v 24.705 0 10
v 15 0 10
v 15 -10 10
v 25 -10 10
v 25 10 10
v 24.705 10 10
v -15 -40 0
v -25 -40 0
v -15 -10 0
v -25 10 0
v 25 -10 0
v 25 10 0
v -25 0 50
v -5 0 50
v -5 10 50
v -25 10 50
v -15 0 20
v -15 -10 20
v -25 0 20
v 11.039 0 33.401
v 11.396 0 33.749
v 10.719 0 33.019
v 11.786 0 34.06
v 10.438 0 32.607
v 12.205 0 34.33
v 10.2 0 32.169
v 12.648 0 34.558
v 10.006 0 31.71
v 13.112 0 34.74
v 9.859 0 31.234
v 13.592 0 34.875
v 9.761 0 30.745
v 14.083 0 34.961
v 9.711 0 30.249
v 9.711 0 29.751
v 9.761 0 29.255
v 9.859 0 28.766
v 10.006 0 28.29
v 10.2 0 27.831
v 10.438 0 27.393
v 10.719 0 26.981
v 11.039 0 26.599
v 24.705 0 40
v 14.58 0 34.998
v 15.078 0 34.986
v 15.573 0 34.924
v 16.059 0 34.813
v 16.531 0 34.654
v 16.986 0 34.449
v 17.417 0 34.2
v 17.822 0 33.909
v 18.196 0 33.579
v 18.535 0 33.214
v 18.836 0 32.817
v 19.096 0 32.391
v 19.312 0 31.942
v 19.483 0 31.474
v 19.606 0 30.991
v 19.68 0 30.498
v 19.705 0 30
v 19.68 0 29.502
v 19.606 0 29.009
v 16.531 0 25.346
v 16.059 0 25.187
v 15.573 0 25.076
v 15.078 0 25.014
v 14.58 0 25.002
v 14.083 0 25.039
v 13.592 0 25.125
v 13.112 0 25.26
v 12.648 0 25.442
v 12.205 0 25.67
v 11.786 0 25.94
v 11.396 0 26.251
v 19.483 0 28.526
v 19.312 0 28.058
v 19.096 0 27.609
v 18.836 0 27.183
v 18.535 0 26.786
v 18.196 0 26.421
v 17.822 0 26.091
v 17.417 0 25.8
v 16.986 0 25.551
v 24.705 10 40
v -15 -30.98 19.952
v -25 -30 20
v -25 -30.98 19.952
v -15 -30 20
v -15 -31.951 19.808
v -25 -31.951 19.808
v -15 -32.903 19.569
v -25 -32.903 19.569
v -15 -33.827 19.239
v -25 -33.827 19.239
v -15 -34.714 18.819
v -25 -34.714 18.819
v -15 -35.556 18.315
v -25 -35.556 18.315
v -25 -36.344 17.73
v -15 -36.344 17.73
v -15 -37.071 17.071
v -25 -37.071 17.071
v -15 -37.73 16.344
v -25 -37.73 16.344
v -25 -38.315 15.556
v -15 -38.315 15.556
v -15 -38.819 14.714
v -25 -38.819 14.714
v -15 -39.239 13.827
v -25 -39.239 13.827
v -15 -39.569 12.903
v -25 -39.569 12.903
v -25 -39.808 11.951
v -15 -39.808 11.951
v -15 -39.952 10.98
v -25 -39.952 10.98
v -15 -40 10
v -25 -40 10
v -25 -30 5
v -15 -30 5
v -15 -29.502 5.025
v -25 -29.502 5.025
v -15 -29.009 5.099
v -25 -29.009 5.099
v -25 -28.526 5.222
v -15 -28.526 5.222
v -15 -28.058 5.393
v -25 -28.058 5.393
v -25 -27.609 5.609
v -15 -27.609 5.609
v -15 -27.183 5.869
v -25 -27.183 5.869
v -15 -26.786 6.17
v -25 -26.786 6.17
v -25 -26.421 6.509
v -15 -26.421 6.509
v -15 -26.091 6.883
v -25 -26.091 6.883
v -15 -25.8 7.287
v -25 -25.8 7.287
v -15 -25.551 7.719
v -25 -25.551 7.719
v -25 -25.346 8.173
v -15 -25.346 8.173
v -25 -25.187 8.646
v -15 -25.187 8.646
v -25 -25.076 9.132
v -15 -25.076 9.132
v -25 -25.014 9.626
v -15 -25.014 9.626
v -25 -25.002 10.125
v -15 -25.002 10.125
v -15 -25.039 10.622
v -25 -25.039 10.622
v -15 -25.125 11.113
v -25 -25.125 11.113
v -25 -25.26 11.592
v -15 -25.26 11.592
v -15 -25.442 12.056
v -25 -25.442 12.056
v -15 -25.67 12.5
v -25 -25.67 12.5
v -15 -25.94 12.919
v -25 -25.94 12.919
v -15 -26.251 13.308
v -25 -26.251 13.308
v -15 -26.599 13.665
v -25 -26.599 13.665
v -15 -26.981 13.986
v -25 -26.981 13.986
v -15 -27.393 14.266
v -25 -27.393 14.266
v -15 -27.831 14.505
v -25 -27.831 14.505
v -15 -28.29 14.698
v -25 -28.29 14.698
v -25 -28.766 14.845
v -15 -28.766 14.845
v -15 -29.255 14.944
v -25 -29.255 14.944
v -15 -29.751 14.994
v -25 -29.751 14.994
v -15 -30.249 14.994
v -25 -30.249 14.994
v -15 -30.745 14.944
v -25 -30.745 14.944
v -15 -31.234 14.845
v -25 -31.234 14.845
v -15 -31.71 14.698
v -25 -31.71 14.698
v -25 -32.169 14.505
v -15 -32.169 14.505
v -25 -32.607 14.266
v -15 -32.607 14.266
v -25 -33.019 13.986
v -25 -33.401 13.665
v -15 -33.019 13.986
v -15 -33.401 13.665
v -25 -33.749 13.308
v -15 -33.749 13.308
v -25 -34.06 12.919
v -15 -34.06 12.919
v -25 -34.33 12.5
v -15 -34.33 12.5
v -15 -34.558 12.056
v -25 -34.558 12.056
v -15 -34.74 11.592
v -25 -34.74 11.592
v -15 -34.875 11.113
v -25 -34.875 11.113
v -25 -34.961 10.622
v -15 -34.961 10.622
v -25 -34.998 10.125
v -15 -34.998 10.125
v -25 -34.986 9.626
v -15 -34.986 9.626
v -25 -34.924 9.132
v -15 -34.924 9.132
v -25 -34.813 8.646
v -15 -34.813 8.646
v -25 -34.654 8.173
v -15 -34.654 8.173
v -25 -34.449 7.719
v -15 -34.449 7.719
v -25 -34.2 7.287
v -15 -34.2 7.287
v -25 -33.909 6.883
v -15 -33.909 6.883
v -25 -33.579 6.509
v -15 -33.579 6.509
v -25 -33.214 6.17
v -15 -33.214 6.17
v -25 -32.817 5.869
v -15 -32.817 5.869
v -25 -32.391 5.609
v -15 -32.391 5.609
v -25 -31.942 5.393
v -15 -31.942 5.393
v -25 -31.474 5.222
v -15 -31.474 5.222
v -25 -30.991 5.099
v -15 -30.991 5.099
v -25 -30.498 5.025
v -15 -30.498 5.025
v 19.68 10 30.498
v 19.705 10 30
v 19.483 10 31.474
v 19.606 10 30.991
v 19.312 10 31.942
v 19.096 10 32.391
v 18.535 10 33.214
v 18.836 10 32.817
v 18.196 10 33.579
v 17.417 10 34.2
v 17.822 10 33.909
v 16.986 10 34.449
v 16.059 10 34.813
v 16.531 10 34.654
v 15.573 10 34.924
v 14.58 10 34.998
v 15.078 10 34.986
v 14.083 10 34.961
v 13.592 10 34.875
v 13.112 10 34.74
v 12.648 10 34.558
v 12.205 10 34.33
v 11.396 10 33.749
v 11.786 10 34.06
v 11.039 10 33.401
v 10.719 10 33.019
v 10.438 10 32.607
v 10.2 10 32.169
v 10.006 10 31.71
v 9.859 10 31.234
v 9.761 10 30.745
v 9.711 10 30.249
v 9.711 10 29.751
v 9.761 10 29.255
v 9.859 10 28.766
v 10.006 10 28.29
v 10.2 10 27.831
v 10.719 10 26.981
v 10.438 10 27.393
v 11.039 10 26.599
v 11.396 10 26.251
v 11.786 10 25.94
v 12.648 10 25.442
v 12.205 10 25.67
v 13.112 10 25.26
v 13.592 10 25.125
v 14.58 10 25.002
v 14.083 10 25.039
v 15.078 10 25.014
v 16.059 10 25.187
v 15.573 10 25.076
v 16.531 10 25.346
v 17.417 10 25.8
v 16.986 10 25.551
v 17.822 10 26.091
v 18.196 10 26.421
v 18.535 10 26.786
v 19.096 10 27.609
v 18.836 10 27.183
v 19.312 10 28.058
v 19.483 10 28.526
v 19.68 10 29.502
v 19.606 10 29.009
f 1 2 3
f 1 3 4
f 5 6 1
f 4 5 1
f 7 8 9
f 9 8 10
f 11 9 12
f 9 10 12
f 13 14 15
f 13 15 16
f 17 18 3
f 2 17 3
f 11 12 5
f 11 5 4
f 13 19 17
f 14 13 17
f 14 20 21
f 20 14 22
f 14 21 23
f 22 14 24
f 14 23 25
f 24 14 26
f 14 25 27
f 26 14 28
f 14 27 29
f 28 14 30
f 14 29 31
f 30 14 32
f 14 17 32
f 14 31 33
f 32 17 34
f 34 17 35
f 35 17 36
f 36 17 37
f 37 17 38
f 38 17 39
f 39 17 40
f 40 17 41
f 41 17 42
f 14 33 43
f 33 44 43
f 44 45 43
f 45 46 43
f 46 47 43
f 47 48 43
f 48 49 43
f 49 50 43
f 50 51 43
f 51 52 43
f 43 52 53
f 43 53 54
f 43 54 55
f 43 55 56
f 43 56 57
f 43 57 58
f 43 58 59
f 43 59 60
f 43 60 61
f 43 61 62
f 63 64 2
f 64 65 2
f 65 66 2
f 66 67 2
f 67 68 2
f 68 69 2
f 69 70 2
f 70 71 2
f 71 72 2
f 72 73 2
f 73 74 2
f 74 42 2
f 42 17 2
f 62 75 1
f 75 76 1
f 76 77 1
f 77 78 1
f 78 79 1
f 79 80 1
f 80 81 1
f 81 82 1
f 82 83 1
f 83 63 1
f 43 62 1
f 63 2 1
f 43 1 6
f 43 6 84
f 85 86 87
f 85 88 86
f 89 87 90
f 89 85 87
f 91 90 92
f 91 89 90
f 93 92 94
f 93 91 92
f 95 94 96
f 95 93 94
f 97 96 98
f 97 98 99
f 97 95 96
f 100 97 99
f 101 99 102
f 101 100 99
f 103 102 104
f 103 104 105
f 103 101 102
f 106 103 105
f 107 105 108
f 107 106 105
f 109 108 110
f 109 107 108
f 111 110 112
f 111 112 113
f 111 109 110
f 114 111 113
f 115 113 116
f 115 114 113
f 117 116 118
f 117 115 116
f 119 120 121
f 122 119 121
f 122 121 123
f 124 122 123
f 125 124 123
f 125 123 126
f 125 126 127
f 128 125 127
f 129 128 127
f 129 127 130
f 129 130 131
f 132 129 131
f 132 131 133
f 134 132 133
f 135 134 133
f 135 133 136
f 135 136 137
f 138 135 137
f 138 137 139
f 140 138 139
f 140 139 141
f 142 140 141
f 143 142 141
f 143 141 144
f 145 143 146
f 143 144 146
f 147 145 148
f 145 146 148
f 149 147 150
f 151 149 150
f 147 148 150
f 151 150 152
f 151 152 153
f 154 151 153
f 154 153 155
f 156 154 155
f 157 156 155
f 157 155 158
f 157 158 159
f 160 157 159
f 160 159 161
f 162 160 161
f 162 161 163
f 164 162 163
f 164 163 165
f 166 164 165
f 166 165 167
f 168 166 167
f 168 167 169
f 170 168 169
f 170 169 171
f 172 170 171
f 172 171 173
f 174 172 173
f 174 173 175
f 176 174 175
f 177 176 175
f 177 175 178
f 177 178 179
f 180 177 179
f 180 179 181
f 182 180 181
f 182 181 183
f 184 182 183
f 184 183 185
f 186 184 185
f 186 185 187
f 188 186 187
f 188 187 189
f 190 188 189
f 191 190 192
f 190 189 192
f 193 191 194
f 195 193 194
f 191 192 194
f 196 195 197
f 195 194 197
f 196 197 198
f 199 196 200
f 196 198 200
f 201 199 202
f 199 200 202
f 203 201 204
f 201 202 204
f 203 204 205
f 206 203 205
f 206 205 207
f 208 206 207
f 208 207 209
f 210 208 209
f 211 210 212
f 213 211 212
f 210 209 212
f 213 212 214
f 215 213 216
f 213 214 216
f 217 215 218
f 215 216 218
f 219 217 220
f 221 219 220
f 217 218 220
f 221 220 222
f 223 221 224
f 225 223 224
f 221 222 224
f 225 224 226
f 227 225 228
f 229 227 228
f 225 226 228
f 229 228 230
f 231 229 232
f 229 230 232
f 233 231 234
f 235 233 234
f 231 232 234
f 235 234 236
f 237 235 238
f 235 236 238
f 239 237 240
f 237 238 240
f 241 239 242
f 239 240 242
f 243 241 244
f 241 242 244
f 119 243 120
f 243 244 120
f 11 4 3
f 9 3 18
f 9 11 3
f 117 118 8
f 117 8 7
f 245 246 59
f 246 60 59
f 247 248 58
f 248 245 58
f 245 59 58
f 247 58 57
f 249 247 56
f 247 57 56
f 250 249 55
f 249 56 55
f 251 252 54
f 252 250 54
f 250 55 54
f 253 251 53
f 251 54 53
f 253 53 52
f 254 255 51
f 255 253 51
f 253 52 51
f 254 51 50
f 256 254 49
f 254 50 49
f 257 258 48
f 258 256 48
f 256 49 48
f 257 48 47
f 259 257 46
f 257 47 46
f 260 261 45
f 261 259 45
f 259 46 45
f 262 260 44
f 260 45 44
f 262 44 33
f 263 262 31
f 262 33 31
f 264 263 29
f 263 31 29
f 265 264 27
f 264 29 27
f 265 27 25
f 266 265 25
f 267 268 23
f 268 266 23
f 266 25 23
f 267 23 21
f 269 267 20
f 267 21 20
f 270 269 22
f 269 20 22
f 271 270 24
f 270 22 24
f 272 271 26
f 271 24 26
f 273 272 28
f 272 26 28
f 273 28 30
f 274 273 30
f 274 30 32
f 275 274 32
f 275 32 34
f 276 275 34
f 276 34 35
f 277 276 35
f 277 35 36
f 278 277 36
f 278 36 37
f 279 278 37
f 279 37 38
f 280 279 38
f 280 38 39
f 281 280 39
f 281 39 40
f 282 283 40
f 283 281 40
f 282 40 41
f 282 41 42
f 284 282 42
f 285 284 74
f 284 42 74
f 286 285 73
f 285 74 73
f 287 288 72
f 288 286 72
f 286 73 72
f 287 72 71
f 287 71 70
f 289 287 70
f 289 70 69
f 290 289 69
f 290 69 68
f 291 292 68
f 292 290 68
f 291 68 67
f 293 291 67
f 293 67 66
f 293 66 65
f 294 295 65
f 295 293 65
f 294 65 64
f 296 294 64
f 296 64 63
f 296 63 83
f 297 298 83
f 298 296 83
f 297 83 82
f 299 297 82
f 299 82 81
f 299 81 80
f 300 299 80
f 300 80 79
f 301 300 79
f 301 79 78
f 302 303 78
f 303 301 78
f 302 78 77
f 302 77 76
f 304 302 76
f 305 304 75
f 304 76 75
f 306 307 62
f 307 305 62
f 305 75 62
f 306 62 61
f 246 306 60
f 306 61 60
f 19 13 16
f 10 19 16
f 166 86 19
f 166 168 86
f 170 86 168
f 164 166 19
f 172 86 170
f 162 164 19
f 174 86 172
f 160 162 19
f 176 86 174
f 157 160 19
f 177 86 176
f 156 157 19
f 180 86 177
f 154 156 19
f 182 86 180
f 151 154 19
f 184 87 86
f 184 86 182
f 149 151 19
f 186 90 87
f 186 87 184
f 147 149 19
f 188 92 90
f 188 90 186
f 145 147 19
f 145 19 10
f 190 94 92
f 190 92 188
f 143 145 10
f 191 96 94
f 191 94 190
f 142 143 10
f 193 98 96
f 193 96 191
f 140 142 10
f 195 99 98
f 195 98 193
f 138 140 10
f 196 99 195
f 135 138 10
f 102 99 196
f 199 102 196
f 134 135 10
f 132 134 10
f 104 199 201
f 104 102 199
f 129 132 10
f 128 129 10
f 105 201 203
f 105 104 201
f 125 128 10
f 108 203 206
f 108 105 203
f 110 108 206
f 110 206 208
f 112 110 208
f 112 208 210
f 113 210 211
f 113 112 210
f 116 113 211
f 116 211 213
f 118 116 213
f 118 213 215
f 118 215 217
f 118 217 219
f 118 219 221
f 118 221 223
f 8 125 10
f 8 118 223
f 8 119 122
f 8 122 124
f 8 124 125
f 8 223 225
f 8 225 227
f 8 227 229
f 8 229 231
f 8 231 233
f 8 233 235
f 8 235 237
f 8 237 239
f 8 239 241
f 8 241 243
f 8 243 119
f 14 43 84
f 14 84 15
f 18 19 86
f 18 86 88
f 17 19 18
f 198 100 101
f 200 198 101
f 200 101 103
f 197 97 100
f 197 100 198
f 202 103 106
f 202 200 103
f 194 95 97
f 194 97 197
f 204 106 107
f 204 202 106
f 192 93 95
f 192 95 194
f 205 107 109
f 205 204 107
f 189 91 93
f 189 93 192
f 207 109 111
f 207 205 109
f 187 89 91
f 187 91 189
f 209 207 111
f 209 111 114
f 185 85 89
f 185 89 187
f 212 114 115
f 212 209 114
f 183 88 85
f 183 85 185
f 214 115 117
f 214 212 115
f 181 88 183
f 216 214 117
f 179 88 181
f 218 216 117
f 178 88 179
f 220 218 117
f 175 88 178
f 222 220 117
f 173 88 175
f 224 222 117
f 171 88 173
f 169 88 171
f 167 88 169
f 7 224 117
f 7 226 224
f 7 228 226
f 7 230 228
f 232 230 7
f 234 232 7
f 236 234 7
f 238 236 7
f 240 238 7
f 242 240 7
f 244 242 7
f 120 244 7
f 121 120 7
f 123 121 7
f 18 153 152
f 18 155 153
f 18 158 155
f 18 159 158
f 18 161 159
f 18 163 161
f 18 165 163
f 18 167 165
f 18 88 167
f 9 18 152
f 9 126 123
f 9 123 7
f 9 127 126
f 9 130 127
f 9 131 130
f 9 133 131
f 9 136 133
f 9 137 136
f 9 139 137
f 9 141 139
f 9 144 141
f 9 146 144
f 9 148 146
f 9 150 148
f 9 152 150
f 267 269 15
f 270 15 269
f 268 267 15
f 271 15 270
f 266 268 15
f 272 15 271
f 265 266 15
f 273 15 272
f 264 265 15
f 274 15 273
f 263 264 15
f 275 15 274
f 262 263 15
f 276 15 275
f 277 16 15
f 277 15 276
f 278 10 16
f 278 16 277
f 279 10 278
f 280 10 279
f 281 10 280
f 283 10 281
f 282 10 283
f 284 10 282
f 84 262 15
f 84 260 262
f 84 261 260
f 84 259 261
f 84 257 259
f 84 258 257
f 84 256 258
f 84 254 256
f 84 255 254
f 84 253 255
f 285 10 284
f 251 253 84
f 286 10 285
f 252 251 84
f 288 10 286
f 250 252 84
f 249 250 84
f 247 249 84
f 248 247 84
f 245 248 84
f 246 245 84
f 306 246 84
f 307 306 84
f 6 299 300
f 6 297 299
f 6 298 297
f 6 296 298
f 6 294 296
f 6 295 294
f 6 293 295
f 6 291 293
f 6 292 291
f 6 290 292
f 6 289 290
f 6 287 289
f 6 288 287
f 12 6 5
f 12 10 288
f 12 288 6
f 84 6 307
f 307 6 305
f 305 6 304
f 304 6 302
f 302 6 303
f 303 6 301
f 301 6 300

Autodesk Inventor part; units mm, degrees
ref_plane "YZ Plane" through (0, 0, 0) normal (1, 0, 0) x (0, 1, 0)
ref_plane "XZ Plane" through (0, 0, 0) normal (0, 1, 0) x (-1, 0, 0)
ref_plane "XY Plane" through (0, 0, 0) normal (0, 0, 1) x (1, 0, 0)
sketch "草圖1" plane through (0, 0, 0) normal (0, 0, 1) x (1, 0, 0)
  line L0 (25, -10) -> (-25, -10)
  line L1 (-25, -10) -> (-25, 10)
  line L2 (-25, 10) -> (25, 10)
  line L3 (25, 10) -> (25, -10)
  line L4 (25, -10) -> (-25, 10) construction
  line L5 (-25, -10) -> (25, 10) construction
  point P0 (0, 0)
  dimension "d0" = 50
  dimension "d1" = 20
extrude "擠出1" add sketch "草圖1" along normal blind 10
sketch "草圖2" plane through (-25, -10, 0) normal (0, -1, 0) x (1, 0, 0)
  line L0 (0, 10) -> (0, 20)
  line L1 (0, 20) -> (10, 20)
  line L2 (50, 0) -> (50, 10) projected
  line L3 (0, 10) -> (50, 10) projected
  line L4 (10, 20) -> (40, 10)
  point P0 (25, 0)
  dimension "d4" = 10
  dimension "d5" = 10
  dimension "d6" = 40
extrude "擠出2" add sketch "草圖2" against normal blind 10
sketch "草圖3" plane through (-25, -10, 0) normal (0, -1, 0) x (1, 0, 0)
  line L0 (0, 0) -> (0, 20) projected
  line L1 (0, 0) -> (50, 0) projected
  line L2 (0, 20) -> (10, 20)
  line L3 (10, 20) -> (10, 0)
  line L4 (10, 0) -> (0, 0)
  line L5 (0, 0) -> (0, 20)
  point P0 (25, 0)
  dimension "d9" = 10
extrude "擠出3" add sketch "草圖3" along normal blind 30
fillet "圓角1" radius 10 1 edges at (-20, -40, 20)
sketch "草圖4" plane through (-15, -10, 20) normal (1, 0, 0) x (0, 0, -1)
  circle A0 centre (10, -20) radius 5
  line L0 (20, 0) -> (20, -30) projected
  line L1 (20, -30) -> (10, -30) projected
  point P0 (20, 10)
  dimension "d13" = 10
  dimension "d14" = 10
  dimension "d15" = 10
extrude "擠出4" cut sketch "草圖4" against normal blind 30
sketch "草圖5" plane through (-25, 0, 0) normal (0, 1, 0) x (1, 0, 0)
  line L0 (0, -20) -> (0, -10) projected
  line L1 (0, -10) -> (0, -50)
  line L2 (49.7047, -10) -> (49.7047, -40)
  line L3 (49.7047, -40) -> (20, -50)
  line L4 (20, -50) -> (0, -50)
  line L5 (50, -10) -> (0, -10) projected
  circle A0 centre (39.7047, -30) radius 5
  point P0 (25, 0)
  dimension "d18" = 40
  dimension "d19" = 30
  dimension "d20" = 20
  dimension "d21" = 10
  dimension "d22" = 20
  dimension "d23" = 10
extrude "擠出5" add sketch "草圖5" along normal blind 10
properties part number "件30"
